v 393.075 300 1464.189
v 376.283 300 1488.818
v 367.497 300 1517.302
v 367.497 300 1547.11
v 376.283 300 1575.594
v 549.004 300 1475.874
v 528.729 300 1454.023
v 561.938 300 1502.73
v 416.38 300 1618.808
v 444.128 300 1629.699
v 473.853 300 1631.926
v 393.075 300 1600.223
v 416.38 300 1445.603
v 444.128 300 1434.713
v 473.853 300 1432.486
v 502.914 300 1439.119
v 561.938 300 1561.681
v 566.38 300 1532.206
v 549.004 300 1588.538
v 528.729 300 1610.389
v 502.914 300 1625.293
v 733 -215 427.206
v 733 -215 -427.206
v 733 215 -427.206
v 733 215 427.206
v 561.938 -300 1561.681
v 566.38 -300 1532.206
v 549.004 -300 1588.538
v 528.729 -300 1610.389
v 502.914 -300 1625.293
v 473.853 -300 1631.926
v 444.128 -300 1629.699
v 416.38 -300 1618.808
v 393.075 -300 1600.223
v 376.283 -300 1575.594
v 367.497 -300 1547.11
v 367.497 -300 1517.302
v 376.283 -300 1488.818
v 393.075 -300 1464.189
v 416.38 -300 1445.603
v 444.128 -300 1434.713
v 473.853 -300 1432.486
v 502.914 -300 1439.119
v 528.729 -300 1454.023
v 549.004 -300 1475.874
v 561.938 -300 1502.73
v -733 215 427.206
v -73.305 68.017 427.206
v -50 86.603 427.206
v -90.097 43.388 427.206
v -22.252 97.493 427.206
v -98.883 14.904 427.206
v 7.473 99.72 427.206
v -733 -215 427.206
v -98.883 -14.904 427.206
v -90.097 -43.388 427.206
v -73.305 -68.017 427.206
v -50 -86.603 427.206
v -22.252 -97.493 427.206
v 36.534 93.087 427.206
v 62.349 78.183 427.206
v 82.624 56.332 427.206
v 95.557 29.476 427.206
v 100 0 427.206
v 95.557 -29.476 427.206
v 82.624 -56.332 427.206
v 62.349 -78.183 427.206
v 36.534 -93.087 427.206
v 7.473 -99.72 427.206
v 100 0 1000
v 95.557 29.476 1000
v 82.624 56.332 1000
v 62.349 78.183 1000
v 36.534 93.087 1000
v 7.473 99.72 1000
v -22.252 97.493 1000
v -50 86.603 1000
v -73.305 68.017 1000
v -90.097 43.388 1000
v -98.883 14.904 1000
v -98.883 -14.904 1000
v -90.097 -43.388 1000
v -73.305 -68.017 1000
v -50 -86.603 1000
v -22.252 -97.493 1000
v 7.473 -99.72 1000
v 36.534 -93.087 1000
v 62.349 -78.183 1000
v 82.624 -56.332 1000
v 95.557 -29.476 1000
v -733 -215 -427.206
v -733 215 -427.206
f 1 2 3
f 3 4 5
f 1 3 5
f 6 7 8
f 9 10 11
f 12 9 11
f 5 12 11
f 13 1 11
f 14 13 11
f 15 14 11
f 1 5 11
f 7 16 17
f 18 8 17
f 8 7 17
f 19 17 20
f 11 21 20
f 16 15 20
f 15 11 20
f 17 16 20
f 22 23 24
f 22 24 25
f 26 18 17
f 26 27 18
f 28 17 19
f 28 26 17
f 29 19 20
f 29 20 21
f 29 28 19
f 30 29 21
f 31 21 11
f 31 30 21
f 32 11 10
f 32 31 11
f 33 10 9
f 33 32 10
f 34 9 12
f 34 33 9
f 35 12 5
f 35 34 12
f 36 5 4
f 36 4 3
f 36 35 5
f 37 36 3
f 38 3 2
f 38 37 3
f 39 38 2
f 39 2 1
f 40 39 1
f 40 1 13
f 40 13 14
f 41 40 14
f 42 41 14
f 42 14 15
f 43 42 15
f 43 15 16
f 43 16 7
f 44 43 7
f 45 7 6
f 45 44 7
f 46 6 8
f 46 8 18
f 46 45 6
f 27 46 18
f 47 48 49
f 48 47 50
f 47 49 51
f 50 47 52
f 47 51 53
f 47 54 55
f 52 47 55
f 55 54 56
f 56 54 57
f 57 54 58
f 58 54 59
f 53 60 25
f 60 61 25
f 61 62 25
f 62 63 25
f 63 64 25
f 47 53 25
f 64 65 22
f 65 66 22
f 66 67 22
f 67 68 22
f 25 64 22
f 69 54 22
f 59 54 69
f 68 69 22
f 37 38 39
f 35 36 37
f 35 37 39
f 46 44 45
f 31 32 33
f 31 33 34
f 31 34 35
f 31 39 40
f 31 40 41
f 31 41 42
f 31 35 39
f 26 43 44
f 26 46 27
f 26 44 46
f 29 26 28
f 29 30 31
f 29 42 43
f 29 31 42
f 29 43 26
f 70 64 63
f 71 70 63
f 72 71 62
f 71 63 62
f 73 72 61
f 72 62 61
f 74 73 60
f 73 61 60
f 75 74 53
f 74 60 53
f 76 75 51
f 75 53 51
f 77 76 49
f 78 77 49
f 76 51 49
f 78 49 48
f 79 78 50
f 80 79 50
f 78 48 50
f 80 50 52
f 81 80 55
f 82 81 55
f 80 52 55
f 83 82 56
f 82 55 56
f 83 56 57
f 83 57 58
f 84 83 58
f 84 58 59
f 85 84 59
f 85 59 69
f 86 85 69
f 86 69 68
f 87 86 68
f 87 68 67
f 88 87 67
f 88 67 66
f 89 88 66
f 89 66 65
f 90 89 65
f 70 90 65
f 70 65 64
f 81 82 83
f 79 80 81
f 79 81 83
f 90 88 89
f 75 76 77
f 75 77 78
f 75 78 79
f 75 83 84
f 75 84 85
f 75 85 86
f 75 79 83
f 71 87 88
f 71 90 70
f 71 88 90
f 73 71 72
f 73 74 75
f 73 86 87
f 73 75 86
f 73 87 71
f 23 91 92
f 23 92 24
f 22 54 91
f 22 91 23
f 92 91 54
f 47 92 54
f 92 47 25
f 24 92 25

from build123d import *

# Parameters (mm, degrees)
F0_W     = 1466
F0_H     = 854.411854
F1_DEPTH = 215
F0_R     = 100
F2_DEPTH = 300
F3_R     = 100
F4_DEPTH = 1000


with BuildPart() as f1:
    # F0 (on Front) → F1 (new body, symmetric)
    with BuildSketch(Plane.XZ):
        Rectangle(F0_W, F0_H)
    extrude(amount=F1_DEPTH, both=True)

    # F3 (on Top) → F4 (join)
    with BuildSketch(Plane.XY):
        Circle(F3_R)
    extrude(amount=F4_DEPTH)


with BuildPart() as f2:
    # F0 (on Front) → F2 (new body, symmetric)
    with BuildSketch(Plane.XZ):
        with Locations((466.380358, 1532.205927)):
            Circle(F0_R)
    extrude(amount=F2_DEPTH, both=True)


solid = Compound([f1.part, f2.part])
